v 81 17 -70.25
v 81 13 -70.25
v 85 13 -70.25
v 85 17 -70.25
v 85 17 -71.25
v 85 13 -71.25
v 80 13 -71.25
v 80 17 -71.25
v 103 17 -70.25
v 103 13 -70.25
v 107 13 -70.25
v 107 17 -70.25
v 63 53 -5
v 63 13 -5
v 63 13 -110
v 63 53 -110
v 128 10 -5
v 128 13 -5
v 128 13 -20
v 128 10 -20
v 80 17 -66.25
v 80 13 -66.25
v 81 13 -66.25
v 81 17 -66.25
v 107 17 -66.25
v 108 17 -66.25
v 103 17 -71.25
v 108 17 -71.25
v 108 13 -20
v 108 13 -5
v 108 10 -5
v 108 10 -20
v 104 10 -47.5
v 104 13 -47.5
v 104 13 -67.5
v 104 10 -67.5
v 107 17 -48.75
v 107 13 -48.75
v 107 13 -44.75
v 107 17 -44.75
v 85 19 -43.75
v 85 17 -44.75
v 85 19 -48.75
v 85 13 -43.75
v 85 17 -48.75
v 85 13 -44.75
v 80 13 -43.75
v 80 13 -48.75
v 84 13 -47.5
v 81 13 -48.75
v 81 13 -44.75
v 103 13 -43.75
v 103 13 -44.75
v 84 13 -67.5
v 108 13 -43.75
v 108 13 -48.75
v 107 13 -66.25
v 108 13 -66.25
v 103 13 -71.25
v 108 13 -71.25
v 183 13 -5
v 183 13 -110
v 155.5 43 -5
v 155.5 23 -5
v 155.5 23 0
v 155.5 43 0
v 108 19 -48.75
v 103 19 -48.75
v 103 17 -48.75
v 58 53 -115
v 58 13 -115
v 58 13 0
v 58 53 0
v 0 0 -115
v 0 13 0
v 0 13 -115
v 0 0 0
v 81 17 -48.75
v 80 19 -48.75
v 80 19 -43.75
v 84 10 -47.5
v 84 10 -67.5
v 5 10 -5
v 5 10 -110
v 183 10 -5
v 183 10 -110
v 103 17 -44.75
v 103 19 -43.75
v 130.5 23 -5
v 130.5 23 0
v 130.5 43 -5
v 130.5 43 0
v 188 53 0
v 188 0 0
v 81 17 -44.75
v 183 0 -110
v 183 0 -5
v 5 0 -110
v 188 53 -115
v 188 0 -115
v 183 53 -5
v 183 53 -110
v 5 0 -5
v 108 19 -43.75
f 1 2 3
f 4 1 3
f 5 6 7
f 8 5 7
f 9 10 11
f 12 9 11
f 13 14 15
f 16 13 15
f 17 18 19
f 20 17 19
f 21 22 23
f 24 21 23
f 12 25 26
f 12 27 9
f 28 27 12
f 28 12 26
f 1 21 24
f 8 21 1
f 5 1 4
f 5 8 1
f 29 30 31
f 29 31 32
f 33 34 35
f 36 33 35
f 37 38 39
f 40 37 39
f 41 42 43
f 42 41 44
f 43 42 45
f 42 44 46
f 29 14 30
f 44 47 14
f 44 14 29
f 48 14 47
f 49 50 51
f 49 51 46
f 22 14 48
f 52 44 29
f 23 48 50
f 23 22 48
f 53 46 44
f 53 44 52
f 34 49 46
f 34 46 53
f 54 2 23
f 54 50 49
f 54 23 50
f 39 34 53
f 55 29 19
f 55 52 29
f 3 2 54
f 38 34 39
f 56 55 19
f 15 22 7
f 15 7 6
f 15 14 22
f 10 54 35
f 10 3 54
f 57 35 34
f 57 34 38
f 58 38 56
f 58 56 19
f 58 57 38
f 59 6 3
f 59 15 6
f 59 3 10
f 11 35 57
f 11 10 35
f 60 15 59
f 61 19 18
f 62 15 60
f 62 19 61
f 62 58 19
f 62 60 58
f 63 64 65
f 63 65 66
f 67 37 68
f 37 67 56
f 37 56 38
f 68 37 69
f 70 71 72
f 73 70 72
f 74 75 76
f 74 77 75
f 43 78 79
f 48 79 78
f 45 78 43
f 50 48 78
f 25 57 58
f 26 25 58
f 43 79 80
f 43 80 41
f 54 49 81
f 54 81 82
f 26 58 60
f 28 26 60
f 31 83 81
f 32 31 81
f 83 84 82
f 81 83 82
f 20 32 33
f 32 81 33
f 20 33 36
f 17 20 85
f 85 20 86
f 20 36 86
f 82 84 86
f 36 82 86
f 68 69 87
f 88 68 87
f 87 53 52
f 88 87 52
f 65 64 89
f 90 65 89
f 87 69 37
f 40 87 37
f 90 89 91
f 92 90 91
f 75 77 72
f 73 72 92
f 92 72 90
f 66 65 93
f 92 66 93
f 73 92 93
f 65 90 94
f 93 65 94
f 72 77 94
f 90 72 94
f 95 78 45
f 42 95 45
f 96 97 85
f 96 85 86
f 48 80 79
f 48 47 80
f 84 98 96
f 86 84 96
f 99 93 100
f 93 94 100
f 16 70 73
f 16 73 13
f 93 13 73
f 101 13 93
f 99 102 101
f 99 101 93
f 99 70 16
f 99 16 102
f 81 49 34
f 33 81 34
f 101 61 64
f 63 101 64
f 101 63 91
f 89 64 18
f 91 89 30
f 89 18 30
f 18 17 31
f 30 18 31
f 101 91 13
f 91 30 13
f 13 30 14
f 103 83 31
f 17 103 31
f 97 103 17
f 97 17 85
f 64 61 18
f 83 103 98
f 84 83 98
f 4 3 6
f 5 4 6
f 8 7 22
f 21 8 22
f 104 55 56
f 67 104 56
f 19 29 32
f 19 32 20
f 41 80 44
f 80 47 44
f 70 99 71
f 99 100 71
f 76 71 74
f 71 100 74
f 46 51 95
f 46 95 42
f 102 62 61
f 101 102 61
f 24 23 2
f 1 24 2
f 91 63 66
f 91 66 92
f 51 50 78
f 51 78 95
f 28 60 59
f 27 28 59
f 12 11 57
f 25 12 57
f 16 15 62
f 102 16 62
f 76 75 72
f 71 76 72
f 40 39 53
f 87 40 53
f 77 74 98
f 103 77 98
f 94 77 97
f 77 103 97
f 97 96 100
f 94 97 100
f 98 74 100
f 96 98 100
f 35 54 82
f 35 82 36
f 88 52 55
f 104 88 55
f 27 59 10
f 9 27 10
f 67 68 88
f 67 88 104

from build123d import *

# Parameters (mm, degrees)
SKETCH1_W           = 188
SKETCH1_H           = 115
SKETCH1_W_2         = 178
SKETCH1_H_2         = 105
BOSS_EXTRUDE1_DEPTH = 10
SKETCH2_W           = 188
SKETCH2_H           = 115
BOSS_EXTRUDE2_DEPTH = 3
BOSS_EXTRUDE3_DEPTH = 4
CUT_EXTRUDE1_REACH  = 222.767
SKETCH3_3_W         = 20
SKETCH3_3_H         = 20
SKETCH4_W           = 130
SKETCH4_H           = 115
SKETCH4_W_2         = 120
SKETCH4_H_2         = 105
BOSS_EXTRUDE4_DEPTH = 40
SKETCH9_W           = 5
SKETCH9_H           = 5
BOSS_EXTRUDE5_DEPTH = 2
CUT_EXTRUDE2_REACH  = 225.984
SKETCH10_W          = 20
SKETCH10_H          = 15
CUT_EXTRUDE3_REACH  = 226.172
SKETCH11_W          = 25
SKETCH11_H          = 20


with BuildPart() as part:
    # Sketch1 → Boss-Extrude1 (new body)
    with BuildSketch(Plane(origin=(0, 0, 0), x_dir=(1, 0, 0), z_dir=(0, 1, 0))):
        with Locations((94, 57.5)):
            Rectangle(SKETCH1_W, SKETCH1_H)
        with Locations((94, 57.5)):
            Rectangle(SKETCH1_W_2, SKETCH1_H_2, mode=Mode.SUBTRACT)
    extrude(amount=BOSS_EXTRUDE1_DEPTH)

    # Sketch2 → Boss-Extrude2 (add)
    with BuildSketch(Plane(origin=(0, 10, 0), x_dir=(1, 0, 0), z_dir=(0, 1, 0))):
        with Locations((94, 57.5)):
            Rectangle(SKETCH2_W, SKETCH2_H)
    extrude(amount=BOSS_EXTRUDE2_DEPTH)

    # Sketch3 → Boss-Extrude3 (add)
    with BuildSketch(Plane(origin=(0, 13, 0), x_dir=(1, 0, 0), z_dir=(0, 1, 0))):
        Polygon((80, 71.25), (80, 66.25), (81, 66.25), (81, 70.25), (85, 70.25), (85, 71.25), align=None)
        Polygon((85, 44.75), (81, 44.75), (81, 48.75), (80, 48.75), (80, 43.75), (85, 43.75), align=None)
        Polygon((107, 48.75), (107, 44.75), (103, 44.75), (103, 43.75), (108, 43.75), (108, 48.75), align=None)
        Polygon((108, 71.25), (103, 71.25), (103, 70.25), (107, 70.25), (107, 66.25), (108, 66.25), align=None)
    extrude(amount=BOSS_EXTRUDE3_DEPTH)

    # Sketch3<3> → Cut-Extrude1 (cut, up to next)
    with BuildSketch(Plane(origin=(0, 13, 0), x_dir=(1, 0, 0), z_dir=(0, 1, 0)), mode=Mode.PRIVATE) as cut_extrude1_sk1:
        with Locations((94, 57.5)):
            Rectangle(SKETCH3_3_W, SKETCH3_3_H)
    cut_extrude1_tool1 = extrude(cut_extrude1_sk1.sketch, amount=-CUT_EXTRUDE1_REACH, mode=Mode.PRIVATE) & part.part
    add(cut_extrude1_tool1.solids().sort_by_distance((94, 13, -57.5))[0], mode=Mode.SUBTRACT)

    # Sketch4 → Boss-Extrude4 (add)
    with BuildSketch(Plane(origin=(0, 13, 0), x_dir=(1, 0, 0), z_dir=(0, 1, 0))):
        with Locations((123, 57.5)):
            Rectangle(SKETCH4_W, SKETCH4_H)
        with Locations((123, 57.5)):
            Rectangle(SKETCH4_W_2, SKETCH4_H_2, mode=Mode.SUBTRACT)
    extrude(amount=BOSS_EXTRUDE4_DEPTH)

    # Sketch9 → Boss-Extrude5 (add)
    with BuildSketch(Plane(origin=(0, 17, 0), x_dir=(1, 0, 0), z_dir=(0, 1, 0))):
        with Locations((82.5, 46.25)):
            Rectangle(SKETCH9_W, SKETCH9_H)
        with Locations((105.5, 46.25)):
            Rectangle(SKETCH9_W, SKETCH9_H)
    extrude(amount=BOSS_EXTRUDE5_DEPTH)

    # Sketch10 → Cut-Extrude2 (cut, up to next)
    with BuildSketch(Plane(origin=(0, 13, 0), x_dir=(1, 0, 0), z_dir=(0, 1, 0)), mode=Mode.PRIVATE) as cut_extrude2_sk1:
        with Locations((118, 12.5)):
            Rectangle(SKETCH10_W, SKETCH10_H)
    cut_extrude2_tool1 = extrude(cut_extrude2_sk1.sketch, amount=-CUT_EXTRUDE2_REACH, mode=Mode.PRIVATE) & part.part
    add(cut_extrude2_tool1.solids().sort_by_distance((118, 13, -12.5))[0], mode=Mode.SUBTRACT)

    # Sketch11 → Cut-Extrude3 (cut, up to next)
    with BuildSketch(Plane(origin=(0, 0, -5), x_dir=(-1, 0, 0), z_dir=(0, 0, -1)), mode=Mode.PRIVATE) as cut_extrude3_sk1:
        with Locations((-143, 33)):
            Rectangle(SKETCH11_W, SKETCH11_H)
    cut_extrude3_tool1 = extrude(cut_extrude3_sk1.sketch, amount=-CUT_EXTRUDE3_REACH, mode=Mode.PRIVATE) & part.part
    add(cut_extrude3_tool1.solids().sort_by_distance((143, 33, -5))[0], mode=Mode.SUBTRACT)


solid = part.part
